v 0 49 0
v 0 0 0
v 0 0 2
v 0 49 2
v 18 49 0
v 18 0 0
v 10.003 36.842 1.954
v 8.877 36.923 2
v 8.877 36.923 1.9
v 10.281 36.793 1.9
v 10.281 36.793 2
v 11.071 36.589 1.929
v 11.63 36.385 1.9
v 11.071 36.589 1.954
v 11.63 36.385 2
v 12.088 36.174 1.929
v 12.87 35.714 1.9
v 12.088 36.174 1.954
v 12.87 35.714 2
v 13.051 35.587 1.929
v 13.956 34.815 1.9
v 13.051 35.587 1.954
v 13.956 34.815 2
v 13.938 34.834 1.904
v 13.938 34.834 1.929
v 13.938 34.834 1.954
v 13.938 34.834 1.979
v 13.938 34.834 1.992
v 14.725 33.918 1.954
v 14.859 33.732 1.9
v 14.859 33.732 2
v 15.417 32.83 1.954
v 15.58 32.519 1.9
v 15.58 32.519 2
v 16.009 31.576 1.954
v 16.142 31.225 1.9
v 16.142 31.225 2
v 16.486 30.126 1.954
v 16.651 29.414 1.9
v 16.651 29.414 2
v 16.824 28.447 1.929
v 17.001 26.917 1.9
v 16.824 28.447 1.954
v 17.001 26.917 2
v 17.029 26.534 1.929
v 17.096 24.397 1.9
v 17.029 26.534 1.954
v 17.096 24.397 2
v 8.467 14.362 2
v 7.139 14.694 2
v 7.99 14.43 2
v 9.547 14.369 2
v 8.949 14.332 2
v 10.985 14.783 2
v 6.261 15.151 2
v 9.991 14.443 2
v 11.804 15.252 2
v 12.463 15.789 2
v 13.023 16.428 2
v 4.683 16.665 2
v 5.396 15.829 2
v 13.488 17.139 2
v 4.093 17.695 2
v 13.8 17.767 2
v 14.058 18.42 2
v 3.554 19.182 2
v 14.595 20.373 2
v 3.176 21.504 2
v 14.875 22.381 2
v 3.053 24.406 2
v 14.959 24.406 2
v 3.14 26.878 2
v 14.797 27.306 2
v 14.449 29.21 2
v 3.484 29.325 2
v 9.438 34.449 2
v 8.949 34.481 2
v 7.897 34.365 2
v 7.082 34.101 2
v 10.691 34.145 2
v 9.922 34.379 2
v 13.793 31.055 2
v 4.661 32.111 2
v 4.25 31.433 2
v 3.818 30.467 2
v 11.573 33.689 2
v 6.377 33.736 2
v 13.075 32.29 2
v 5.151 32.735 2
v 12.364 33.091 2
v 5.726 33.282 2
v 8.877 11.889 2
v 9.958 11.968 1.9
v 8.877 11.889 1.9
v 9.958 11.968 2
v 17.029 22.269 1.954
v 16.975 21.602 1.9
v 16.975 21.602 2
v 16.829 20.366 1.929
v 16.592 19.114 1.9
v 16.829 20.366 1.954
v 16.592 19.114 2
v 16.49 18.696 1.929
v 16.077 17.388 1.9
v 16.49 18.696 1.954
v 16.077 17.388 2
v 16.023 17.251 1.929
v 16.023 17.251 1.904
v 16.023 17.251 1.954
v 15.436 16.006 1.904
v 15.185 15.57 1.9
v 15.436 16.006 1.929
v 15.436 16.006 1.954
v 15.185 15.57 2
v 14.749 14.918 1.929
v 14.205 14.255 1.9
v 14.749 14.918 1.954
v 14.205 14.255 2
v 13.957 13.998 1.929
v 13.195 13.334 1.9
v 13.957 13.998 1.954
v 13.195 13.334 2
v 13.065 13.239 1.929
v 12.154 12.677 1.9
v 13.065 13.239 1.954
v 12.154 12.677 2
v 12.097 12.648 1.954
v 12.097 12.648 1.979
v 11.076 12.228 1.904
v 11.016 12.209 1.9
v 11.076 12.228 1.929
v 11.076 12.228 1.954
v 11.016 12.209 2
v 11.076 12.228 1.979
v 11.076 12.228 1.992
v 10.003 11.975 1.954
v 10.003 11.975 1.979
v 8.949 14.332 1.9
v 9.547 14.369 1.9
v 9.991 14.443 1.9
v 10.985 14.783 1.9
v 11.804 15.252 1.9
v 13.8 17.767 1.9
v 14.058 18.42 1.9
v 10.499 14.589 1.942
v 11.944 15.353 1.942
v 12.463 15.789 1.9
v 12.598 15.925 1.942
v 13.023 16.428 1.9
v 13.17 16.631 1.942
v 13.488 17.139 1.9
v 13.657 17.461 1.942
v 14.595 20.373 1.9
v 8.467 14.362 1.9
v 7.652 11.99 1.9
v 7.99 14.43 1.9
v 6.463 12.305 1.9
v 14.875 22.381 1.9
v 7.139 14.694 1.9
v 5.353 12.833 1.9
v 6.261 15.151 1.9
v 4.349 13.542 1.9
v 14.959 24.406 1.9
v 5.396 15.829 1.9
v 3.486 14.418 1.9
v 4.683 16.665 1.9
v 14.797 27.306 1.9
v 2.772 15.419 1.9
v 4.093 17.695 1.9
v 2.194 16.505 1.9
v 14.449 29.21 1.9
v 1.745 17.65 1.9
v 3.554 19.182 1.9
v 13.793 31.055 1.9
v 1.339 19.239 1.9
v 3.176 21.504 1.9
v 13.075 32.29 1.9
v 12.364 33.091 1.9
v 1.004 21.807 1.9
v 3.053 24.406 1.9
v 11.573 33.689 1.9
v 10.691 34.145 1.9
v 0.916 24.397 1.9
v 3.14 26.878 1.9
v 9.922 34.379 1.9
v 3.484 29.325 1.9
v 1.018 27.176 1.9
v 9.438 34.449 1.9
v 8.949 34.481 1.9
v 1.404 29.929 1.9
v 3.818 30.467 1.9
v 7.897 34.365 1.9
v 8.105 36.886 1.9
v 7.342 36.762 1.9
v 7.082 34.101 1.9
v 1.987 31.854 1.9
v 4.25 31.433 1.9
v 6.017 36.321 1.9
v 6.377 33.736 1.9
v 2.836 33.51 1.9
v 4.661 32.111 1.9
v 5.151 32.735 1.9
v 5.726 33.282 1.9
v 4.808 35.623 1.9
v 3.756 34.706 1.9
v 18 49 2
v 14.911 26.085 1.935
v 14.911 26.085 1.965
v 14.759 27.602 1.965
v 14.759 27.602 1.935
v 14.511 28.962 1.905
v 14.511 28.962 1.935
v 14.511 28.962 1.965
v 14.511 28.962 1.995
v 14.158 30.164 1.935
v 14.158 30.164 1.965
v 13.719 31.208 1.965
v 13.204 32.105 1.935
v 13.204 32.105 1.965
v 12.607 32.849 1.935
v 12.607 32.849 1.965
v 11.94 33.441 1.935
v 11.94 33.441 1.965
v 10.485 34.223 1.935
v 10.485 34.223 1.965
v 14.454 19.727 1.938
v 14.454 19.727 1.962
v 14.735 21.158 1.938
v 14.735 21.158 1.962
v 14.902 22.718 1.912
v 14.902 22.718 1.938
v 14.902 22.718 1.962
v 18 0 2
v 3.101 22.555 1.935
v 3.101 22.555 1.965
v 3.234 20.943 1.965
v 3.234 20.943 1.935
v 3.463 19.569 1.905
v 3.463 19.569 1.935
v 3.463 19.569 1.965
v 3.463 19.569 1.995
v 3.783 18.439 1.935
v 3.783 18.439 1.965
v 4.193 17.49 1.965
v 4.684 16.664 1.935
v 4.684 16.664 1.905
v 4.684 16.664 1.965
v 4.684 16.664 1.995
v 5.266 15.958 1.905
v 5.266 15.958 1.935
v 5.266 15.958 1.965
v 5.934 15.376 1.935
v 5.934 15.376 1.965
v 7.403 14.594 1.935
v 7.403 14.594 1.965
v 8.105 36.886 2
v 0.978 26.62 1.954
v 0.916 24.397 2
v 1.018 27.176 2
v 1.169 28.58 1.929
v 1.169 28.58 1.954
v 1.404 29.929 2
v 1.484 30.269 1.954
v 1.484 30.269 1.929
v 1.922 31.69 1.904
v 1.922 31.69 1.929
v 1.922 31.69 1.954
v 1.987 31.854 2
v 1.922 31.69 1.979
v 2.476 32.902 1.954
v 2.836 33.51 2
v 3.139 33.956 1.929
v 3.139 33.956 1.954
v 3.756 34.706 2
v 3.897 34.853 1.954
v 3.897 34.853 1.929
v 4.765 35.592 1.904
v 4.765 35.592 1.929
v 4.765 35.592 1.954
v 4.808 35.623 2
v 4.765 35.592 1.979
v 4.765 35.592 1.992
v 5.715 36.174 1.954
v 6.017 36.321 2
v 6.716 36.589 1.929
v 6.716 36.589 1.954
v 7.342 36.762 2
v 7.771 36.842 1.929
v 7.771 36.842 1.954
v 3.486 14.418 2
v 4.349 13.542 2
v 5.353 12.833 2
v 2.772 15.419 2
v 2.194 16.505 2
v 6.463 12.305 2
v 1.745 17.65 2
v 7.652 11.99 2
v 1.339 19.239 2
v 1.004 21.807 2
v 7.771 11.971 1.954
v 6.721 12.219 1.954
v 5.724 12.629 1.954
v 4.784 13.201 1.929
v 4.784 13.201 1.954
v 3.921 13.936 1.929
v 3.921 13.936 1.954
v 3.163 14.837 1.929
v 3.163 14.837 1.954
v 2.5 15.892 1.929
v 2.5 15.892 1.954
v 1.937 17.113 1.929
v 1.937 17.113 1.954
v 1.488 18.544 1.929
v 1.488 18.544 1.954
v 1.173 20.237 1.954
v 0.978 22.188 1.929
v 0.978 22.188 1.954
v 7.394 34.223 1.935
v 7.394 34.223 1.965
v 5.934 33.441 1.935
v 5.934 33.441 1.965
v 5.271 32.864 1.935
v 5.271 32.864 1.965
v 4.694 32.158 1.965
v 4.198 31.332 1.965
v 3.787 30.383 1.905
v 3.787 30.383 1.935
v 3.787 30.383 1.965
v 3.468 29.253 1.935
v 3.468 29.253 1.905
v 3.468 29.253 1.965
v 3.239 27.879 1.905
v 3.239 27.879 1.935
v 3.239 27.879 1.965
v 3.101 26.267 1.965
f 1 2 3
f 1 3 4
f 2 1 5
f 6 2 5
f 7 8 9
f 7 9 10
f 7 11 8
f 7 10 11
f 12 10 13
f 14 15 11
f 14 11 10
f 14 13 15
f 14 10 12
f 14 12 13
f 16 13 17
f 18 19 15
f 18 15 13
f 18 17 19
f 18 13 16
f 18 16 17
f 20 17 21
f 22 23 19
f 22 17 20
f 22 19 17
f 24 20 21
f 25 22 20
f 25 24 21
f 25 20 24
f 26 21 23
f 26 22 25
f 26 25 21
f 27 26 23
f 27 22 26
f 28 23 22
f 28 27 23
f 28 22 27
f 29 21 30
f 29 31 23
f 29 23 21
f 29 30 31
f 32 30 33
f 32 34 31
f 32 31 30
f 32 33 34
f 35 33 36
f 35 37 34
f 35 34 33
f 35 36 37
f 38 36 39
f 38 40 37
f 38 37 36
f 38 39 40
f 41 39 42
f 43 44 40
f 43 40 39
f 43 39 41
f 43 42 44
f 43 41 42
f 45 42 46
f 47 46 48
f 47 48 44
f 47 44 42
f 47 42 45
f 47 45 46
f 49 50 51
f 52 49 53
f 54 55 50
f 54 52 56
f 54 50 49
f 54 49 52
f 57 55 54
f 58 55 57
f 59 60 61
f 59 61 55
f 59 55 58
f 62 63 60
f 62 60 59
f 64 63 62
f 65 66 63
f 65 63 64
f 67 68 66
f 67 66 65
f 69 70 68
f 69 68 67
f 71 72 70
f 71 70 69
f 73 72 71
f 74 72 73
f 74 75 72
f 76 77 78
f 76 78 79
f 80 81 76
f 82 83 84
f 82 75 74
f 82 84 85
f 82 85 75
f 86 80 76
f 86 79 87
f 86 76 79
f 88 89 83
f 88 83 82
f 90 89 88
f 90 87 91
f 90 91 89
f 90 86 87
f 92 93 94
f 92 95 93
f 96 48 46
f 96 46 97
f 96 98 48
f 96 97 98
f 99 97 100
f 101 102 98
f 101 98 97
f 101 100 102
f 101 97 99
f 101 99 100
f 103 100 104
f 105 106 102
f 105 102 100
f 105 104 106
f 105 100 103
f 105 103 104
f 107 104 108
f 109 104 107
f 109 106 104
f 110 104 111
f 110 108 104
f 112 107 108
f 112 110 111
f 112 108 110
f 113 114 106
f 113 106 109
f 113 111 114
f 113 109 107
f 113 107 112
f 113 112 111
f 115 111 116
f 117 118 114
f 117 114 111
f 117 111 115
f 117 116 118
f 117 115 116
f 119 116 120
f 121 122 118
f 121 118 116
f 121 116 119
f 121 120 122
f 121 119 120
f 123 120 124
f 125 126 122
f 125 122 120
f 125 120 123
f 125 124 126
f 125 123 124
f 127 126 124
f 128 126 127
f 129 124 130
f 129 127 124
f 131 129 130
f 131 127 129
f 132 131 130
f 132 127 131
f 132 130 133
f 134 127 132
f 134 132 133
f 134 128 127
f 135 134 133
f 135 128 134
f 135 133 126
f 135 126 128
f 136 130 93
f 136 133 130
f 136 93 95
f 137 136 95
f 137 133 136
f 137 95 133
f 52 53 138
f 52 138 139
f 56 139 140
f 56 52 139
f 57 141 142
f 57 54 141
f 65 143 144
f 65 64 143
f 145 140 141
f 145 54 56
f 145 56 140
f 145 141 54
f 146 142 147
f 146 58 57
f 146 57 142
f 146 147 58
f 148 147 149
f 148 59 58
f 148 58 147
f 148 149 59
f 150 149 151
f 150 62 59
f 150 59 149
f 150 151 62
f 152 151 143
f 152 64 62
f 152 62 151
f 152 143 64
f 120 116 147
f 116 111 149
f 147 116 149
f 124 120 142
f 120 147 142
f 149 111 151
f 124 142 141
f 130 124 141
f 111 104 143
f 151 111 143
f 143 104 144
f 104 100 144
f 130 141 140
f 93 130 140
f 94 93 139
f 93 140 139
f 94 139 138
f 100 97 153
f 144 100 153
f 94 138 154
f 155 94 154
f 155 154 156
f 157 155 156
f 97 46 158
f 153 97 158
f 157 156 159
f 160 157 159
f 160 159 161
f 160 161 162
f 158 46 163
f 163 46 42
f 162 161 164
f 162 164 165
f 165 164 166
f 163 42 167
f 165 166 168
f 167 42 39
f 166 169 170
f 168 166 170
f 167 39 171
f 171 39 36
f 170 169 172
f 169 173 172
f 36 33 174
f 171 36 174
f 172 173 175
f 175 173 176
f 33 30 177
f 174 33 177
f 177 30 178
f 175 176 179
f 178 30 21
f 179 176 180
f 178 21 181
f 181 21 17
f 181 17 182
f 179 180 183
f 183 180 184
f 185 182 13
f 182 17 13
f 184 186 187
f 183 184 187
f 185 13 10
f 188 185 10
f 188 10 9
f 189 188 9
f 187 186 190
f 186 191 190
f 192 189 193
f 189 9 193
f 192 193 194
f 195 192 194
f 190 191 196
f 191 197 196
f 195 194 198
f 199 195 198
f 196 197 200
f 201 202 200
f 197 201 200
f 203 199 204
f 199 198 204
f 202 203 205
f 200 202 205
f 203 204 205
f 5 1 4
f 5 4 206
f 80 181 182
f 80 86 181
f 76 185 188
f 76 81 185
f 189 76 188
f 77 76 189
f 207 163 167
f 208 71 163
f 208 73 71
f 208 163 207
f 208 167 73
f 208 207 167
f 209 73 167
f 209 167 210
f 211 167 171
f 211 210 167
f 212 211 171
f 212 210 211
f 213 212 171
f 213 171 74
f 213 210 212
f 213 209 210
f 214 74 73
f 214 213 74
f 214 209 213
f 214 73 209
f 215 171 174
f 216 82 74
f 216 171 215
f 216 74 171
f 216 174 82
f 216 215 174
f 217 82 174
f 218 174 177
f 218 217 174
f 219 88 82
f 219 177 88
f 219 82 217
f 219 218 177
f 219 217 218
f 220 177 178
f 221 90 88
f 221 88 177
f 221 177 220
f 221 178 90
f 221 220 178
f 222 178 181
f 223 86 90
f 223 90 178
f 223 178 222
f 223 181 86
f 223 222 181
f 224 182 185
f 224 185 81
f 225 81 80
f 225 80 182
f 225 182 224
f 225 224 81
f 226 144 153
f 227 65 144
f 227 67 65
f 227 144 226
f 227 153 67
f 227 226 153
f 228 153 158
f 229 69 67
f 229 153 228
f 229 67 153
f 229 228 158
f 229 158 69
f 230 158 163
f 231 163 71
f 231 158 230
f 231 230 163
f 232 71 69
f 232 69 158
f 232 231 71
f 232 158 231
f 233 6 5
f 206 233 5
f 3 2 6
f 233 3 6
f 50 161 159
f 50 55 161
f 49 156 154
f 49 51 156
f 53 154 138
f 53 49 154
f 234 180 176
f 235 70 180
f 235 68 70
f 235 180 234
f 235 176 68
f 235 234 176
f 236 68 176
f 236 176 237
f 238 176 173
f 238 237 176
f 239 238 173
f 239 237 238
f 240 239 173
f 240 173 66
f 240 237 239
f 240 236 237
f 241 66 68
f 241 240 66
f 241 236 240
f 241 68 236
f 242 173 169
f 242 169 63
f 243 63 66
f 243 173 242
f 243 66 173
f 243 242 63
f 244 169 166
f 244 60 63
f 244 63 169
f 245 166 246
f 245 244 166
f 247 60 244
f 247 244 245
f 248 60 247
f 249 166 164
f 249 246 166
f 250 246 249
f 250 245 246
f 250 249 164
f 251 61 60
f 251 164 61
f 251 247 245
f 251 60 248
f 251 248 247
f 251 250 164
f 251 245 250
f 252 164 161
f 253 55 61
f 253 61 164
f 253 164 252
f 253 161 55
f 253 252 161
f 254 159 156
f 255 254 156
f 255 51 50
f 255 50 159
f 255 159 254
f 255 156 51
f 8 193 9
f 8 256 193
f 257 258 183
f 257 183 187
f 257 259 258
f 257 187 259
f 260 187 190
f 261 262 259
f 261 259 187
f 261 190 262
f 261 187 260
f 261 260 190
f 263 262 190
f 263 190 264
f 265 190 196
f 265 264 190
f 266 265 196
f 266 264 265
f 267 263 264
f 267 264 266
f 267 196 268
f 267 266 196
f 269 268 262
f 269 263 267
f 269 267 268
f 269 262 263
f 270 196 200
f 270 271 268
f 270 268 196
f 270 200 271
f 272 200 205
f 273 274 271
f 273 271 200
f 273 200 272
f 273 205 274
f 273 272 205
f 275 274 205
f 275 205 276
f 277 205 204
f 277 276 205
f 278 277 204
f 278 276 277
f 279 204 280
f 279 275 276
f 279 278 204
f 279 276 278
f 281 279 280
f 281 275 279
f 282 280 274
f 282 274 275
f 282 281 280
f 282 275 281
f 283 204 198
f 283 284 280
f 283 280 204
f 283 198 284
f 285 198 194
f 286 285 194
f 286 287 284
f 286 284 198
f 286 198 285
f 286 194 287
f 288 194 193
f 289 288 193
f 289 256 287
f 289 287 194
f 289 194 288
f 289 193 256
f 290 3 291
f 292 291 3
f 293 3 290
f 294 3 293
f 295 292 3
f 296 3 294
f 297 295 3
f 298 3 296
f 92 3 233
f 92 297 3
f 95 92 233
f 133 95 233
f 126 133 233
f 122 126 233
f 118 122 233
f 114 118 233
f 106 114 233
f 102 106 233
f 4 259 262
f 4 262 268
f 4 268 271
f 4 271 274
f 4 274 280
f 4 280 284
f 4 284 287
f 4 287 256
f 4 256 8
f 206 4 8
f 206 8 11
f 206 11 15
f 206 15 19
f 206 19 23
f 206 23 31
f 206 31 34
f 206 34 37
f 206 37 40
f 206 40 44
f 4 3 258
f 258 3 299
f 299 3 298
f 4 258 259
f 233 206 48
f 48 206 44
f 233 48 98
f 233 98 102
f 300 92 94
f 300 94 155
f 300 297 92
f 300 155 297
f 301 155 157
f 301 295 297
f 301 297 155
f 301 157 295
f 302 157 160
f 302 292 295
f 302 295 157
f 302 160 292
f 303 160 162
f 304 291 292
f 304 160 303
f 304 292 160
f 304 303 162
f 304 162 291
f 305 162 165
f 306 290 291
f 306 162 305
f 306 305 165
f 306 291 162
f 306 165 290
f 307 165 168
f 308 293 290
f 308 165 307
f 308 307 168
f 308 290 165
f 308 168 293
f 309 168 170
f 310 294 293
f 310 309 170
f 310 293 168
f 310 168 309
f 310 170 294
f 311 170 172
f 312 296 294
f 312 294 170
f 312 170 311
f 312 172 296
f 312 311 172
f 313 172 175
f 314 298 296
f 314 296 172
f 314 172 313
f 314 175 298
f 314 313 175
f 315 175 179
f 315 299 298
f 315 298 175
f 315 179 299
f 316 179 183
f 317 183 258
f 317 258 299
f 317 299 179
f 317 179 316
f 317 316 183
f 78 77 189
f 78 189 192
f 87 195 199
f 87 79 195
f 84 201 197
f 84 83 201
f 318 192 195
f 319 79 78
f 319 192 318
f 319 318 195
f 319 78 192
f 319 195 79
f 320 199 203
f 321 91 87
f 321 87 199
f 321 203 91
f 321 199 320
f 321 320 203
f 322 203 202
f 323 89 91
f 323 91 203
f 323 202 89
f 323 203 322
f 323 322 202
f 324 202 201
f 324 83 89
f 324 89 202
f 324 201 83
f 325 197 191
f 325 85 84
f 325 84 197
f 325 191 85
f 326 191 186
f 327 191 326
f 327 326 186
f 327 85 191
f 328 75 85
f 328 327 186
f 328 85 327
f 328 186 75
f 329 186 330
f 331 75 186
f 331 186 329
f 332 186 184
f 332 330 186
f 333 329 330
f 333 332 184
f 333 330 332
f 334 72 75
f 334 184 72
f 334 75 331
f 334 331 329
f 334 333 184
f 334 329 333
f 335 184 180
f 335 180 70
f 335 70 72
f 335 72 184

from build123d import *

# Parameters (mm, degrees)
SKETCH_1_W          = 18
SKETCH_1_H          = 49
EXTRUDE_1_DEPTH     = 2
CUT_EXTRUDE_1_DEPTH = 0.1


with BuildPart() as part:
    # ｽｹｯﾁ1 → ﾎﾞｽ - 押し出し1 (new body)
    with BuildSketch(Plane.XY):
        with Locations((9, 24.5)):
            Rectangle(SKETCH_1_W, SKETCH_1_H)
    extrude(amount=EXTRUDE_1_DEPTH)

    # ｽｹｯﾁ2 → ｶｯﾄ - 押し出し1 (cut)
    with BuildSketch(Plane.XY.offset(2)):
        with BuildLine():
            add(Edge.make_bspline(
                [(0.915865385, 24.396709736), (0.91809708, 24.77837232), (0.922432179, 25.519757391), (0.970658757, 26.600060045), (1.05077314, 27.613522012), (1.160564909, 28.5601918), (1.29417331, 29.440313805), (1.472532246, 30.251535992), (1.675365778, 30.997612959), (1.910445811, 31.68097761), (2.175702018, 32.310836625), (2.464406542, 32.898836655), (2.788017018, 33.444088016), (3.128038515, 33.95529334), (3.498234931, 34.42408455), (3.888071345, 34.85708195), (4.312763039, 35.244278306), (4.757873149, 35.597018327), (5.227431594, 35.906237054), (5.708054019, 36.178602651), (6.203048578, 36.411283891), (6.713766716, 36.594234892), (7.235618047, 36.745347974), (7.77042684, 36.848687065), (8.31907612, 36.913708174), (8.689404274, 36.919924378), (8.877216046, 36.923076923)],
                knots=[0, 0, 0, 0, 1.646270934, 3.197905019, 4.663502075, 6.030701355, 7.308322542, 8.50163776, 9.611534131, 10.641858119, 11.616356847, 12.558055219, 13.465016945, 14.349605745, 15.204443733, 16.039544428, 16.859896111, 17.680448484, 18.487036065, 19.28249412, 20.06191084, 20.843045899, 21.620316918, 22.403196591, 23.190181807, 24, 24, 24, 24], degree=3))
            add(Edge.make_bspline(
                [(8.877216046, 36.923076923), (9.066596712, 36.919758038), (9.443215272, 36.913157819), (10.000022111, 36.84972171), (10.543965481, 36.744462819), (11.072726389, 36.595321902), (11.590648172, 36.410294174), (12.093679803, 36.178380038), (12.58494584, 35.908422029), (13.056639404, 35.59121315), (13.51393884, 35.237548021), (13.945611588, 34.837752006), (14.351696941, 34.395861952), (14.737291429, 33.916605699), (15.091455403, 33.390791104), (15.42873179, 32.8275635), (15.730620106, 32.217073152), (16.021368521, 31.569506041), (16.27233177, 30.866944362), (16.498661046, 30.113348402), (16.681534028, 29.299816881), (16.833861042, 28.43061814), (16.95186828, 27.502560085), (17.037815363, 26.517632117), (17.083216174, 25.475186245), (17.09176623, 24.762458735), (17.096153846, 24.396709736)],
                knots=[0, 0, 0, 0, 0.810914788, 1.612654377, 2.396697861, 3.181598691, 3.963628158, 4.749916497, 5.551656086, 6.361998678, 7.18212741, 8.025565596, 8.878627764, 9.750805457, 10.657531673, 11.591944965, 12.560506719, 13.57287815, 14.630710178, 15.753379473, 16.941251878, 18.199788006, 19.531962791, 20.947069417, 22.433333509, 24, 24, 24, 24], degree=3))
            add(Edge.make_bspline(
                [(17.096153846, 24.396709736), (17.091720744, 24.032556005), (17.083083026, 23.323017311), (17.038324324, 22.285261925), (16.950159351, 21.305560952), (16.839873538, 20.38156477), (16.687126808, 19.517119185), (16.499313088, 18.709232848), (16.290781427, 17.954416932), (16.033369703, 17.258855088), (15.751628977, 16.61284426), (15.445092732, 16.009590983), (15.116685522, 15.44376317), (14.758894239, 14.919889892), (14.377530838, 14.4342601), (13.964433025, 13.995445917), (13.531245652, 13.592874024), (13.072600465, 13.234654916), (12.593550447, 12.921113656), (12.103971728, 12.640712281), (11.595177637, 12.414611266), (11.078698441, 12.220471077), (10.547146522, 12.072150145), (10.001184471, 11.969594092), (9.443589365, 11.897667766), (9.06666086, 11.892180823), (8.877216046, 11.889423077)],
                knots=[0, 0, 0, 0, 1.561518951, 3.042555995, 4.452378317, 5.7783523, 7.031515105, 8.214008947, 9.334062868, 10.386615937, 11.391082383, 12.354592575, 13.286541444, 14.194233754, 15.072674879, 15.931287219, 16.775624067, 17.606195743, 18.42308326, 19.229000347, 20.022332153, 20.807536673, 21.593273796, 22.3848459, 23.188221202, 24, 24, 24, 24], degree=3))
            add(Edge.make_bspline(
                [(8.877216046, 11.889423077), (8.689409484, 11.89259596), (8.319091603, 11.898852265), (7.770367066, 11.963579617), (7.237766871, 12.067643665), (6.718662848, 12.213353061), (6.210391736, 12.391707572), (5.7198795, 12.624074598), (5.241672223, 12.891686746), (4.777045744, 13.196455595), (4.334730863, 13.545626332), (3.912238566, 13.931826225), (3.520182632, 14.364692648), (3.155279232, 14.837390661), (2.808473382, 15.34557147), (2.489458181, 15.896173437), (2.194381478, 16.487013341), (1.924664157, 17.121908411), (1.685527714, 17.810123188), (1.474292414, 18.559530992), (1.307508593, 19.376746302), (1.164749558, 20.255205532), (1.049603309, 21.198683523), (0.970992631, 22.207692478), (0.922406184, 23.281603631), (0.918085437, 24.018224774), (0.915865385, 24.396709736)],
                knots=[0, 0, 0, 0, 0.810891512, 1.598919785, 2.382837074, 3.152667961, 3.926044502, 4.706494248, 5.493654104, 6.291793342, 7.103789334, 7.925228297, 8.761435821, 9.622817696, 10.50288917, 11.416980706, 12.369136599, 13.353924996, 14.394355917, 15.514179734, 16.714354668, 17.994756427, 19.357759367, 20.818452758, 22.365282078, 24, 24, 24, 24], degree=3))
        make_face()
        with BuildLine():
            add(Edge.make_bspline(
                [(3.052884615, 24.40625), (3.053697282, 24.088191888), (3.055274508, 23.470903548), (3.096478302, 22.573898505), (3.152609344, 21.737261089), (3.22500817, 20.959928993), (3.332524659, 20.244533372), (3.452994055, 19.586153921), (3.599598021, 18.988274861), (3.773055197, 18.446793506), (3.970624767, 17.95252038), (4.186337875, 17.492590684), (4.418072436, 17.061571259), (4.6774188, 16.663333674), (4.959869498, 16.296579236), (5.259044707, 15.954816573), (5.586109968, 15.650037111), (6.03857293, 15.284502615), (6.635902515, 14.906774223), (7.388516684, 14.577848147), (8.161868109, 14.371138935), (8.68677215, 14.344851595), (8.948768029, 14.331730769)],
                knots=[0, 0, 0, 0, 1.459021318, 2.831673884, 4.118529203, 5.306027144, 6.411944654, 7.436330062, 8.375795394, 9.233974572, 10.042671642, 10.816086306, 11.563610507, 12.285937304, 12.993564865, 13.685989202, 14.367179055, 15.041617293, 16.353048772, 17.594441528, 18.799311195, 20, 20, 20, 20], degree=3))
            add(Edge.make_bspline(
                [(8.948768029, 14.331730769), (9.212458616, 14.342601385), (9.739295369, 14.364320173), (10.509009225, 14.573861583), (11.256247313, 14.890020414), (11.841843906, 15.263859692), (12.287359068, 15.619879219), (12.606562162, 15.923418165), (12.899537884, 16.263296477), (13.177409858, 16.630004187), (13.432265355, 17.030547338), (13.664016345, 17.462999859), (13.87549412, 17.928562659), (13.995978879, 18.253567491), (14.057579627, 18.419734075)],
                knots=[0, 0, 0, 0, 1.353760809, 2.704726607, 4.075137775, 5.516104923, 6.260822281, 7.007110065, 7.778089737, 8.566572457, 9.372053459, 10.217411131, 11.088608312, 12, 12, 12, 12], degree=3))
            add(Edge.make_bspline(
                [(14.057579627, 18.419734075), (14.129369333, 18.632207838), (14.275133224, 19.063620698), (14.462991902, 19.732844831), (14.610938279, 20.434992207), (14.744039035, 21.165866662), (14.834887505, 21.930858199), (14.90801102, 22.727599847), (14.951082301, 23.556692329), (14.956421411, 24.119993966), (14.959134615, 24.40625)],
                knots=[0, 0, 0, 0, 0.884706709, 1.796334032, 2.740027952, 3.714592787, 4.726048262, 5.777819803, 6.87074269, 8, 8, 8, 8], degree=3))
            add(Edge.make_bspline(
                [(14.959134615, 24.40625), (14.955391364, 24.692459734), (14.948068763, 25.252347159), (14.920078954, 26.07230121), (14.847800706, 26.851090797), (14.767524558, 27.592070977), (14.649161322, 28.291140001), (14.521541243, 28.954150114), (14.350082995, 29.572887479), (14.166932383, 30.157039276), (13.957311656, 30.699968729), (13.726563536, 31.204207168), (13.480126213, 31.672188956), (13.212458469, 32.102630112), (12.92673784, 32.497458663), (12.615423086, 32.848758316), (12.290862978, 33.167416974), (11.836267481, 33.531153381), (11.241129902, 33.902027595), (10.500590766, 34.243333926), (9.729945847, 34.439333202), (9.208972883, 34.46696718), (8.948768029, 34.480769231)],
                knots=[0, 0, 0, 0, 1.31362396, 2.569729283, 3.763502607, 4.902122613, 5.988968491, 7.01645872, 7.998833611, 8.933434873, 9.825090667, 10.667526885, 11.477055099, 12.250526234, 12.991942729, 13.710640831, 14.402115721, 15.076753259, 16.378508321, 17.609869233, 18.806226677, 20, 20, 20, 20], degree=3))
            add(Edge.make_bspline(
                [(8.948768029, 34.480769231), (8.685397751, 34.466948138), (8.158177396, 34.439280775), (7.379522561, 34.244064175), (6.633141169, 33.903797389), (6.039577359, 33.529924997), (5.584664812, 33.173837557), (5.264334344, 32.865047575), (4.963982708, 32.527275737), (4.687297106, 32.157148424), (4.428153947, 31.759375121), (4.190158129, 31.330826561), (3.975727725, 30.869331029), (3.777849006, 30.375279924), (3.603862716, 29.833845284), (3.46034843, 29.236702667), (3.327766873, 28.580417296), (3.233909775, 27.861147072), (3.150472437, 27.083620279), (3.096851123, 26.244894239), (3.055136675, 25.346384794), (3.053650337, 24.725904805), (3.052884615, 24.40625)],
                knots=[0, 0, 0, 0, 1.207732386, 2.417664972, 3.655092373, 4.956220595, 5.625982001, 6.301752483, 6.994047911, 7.697131622, 8.419323945, 9.170223765, 9.943494443, 10.752040957, 11.610060368, 12.549350801, 13.567764191, 14.679664412, 15.874934091, 17.154273443, 18.533957287, 20, 20, 20, 20], degree=3))
        make_face(mode=Mode.SUBTRACT)
    extrude(amount=-CUT_EXTRUDE_1_DEPTH, mode=Mode.SUBTRACT)


solid = part.part
